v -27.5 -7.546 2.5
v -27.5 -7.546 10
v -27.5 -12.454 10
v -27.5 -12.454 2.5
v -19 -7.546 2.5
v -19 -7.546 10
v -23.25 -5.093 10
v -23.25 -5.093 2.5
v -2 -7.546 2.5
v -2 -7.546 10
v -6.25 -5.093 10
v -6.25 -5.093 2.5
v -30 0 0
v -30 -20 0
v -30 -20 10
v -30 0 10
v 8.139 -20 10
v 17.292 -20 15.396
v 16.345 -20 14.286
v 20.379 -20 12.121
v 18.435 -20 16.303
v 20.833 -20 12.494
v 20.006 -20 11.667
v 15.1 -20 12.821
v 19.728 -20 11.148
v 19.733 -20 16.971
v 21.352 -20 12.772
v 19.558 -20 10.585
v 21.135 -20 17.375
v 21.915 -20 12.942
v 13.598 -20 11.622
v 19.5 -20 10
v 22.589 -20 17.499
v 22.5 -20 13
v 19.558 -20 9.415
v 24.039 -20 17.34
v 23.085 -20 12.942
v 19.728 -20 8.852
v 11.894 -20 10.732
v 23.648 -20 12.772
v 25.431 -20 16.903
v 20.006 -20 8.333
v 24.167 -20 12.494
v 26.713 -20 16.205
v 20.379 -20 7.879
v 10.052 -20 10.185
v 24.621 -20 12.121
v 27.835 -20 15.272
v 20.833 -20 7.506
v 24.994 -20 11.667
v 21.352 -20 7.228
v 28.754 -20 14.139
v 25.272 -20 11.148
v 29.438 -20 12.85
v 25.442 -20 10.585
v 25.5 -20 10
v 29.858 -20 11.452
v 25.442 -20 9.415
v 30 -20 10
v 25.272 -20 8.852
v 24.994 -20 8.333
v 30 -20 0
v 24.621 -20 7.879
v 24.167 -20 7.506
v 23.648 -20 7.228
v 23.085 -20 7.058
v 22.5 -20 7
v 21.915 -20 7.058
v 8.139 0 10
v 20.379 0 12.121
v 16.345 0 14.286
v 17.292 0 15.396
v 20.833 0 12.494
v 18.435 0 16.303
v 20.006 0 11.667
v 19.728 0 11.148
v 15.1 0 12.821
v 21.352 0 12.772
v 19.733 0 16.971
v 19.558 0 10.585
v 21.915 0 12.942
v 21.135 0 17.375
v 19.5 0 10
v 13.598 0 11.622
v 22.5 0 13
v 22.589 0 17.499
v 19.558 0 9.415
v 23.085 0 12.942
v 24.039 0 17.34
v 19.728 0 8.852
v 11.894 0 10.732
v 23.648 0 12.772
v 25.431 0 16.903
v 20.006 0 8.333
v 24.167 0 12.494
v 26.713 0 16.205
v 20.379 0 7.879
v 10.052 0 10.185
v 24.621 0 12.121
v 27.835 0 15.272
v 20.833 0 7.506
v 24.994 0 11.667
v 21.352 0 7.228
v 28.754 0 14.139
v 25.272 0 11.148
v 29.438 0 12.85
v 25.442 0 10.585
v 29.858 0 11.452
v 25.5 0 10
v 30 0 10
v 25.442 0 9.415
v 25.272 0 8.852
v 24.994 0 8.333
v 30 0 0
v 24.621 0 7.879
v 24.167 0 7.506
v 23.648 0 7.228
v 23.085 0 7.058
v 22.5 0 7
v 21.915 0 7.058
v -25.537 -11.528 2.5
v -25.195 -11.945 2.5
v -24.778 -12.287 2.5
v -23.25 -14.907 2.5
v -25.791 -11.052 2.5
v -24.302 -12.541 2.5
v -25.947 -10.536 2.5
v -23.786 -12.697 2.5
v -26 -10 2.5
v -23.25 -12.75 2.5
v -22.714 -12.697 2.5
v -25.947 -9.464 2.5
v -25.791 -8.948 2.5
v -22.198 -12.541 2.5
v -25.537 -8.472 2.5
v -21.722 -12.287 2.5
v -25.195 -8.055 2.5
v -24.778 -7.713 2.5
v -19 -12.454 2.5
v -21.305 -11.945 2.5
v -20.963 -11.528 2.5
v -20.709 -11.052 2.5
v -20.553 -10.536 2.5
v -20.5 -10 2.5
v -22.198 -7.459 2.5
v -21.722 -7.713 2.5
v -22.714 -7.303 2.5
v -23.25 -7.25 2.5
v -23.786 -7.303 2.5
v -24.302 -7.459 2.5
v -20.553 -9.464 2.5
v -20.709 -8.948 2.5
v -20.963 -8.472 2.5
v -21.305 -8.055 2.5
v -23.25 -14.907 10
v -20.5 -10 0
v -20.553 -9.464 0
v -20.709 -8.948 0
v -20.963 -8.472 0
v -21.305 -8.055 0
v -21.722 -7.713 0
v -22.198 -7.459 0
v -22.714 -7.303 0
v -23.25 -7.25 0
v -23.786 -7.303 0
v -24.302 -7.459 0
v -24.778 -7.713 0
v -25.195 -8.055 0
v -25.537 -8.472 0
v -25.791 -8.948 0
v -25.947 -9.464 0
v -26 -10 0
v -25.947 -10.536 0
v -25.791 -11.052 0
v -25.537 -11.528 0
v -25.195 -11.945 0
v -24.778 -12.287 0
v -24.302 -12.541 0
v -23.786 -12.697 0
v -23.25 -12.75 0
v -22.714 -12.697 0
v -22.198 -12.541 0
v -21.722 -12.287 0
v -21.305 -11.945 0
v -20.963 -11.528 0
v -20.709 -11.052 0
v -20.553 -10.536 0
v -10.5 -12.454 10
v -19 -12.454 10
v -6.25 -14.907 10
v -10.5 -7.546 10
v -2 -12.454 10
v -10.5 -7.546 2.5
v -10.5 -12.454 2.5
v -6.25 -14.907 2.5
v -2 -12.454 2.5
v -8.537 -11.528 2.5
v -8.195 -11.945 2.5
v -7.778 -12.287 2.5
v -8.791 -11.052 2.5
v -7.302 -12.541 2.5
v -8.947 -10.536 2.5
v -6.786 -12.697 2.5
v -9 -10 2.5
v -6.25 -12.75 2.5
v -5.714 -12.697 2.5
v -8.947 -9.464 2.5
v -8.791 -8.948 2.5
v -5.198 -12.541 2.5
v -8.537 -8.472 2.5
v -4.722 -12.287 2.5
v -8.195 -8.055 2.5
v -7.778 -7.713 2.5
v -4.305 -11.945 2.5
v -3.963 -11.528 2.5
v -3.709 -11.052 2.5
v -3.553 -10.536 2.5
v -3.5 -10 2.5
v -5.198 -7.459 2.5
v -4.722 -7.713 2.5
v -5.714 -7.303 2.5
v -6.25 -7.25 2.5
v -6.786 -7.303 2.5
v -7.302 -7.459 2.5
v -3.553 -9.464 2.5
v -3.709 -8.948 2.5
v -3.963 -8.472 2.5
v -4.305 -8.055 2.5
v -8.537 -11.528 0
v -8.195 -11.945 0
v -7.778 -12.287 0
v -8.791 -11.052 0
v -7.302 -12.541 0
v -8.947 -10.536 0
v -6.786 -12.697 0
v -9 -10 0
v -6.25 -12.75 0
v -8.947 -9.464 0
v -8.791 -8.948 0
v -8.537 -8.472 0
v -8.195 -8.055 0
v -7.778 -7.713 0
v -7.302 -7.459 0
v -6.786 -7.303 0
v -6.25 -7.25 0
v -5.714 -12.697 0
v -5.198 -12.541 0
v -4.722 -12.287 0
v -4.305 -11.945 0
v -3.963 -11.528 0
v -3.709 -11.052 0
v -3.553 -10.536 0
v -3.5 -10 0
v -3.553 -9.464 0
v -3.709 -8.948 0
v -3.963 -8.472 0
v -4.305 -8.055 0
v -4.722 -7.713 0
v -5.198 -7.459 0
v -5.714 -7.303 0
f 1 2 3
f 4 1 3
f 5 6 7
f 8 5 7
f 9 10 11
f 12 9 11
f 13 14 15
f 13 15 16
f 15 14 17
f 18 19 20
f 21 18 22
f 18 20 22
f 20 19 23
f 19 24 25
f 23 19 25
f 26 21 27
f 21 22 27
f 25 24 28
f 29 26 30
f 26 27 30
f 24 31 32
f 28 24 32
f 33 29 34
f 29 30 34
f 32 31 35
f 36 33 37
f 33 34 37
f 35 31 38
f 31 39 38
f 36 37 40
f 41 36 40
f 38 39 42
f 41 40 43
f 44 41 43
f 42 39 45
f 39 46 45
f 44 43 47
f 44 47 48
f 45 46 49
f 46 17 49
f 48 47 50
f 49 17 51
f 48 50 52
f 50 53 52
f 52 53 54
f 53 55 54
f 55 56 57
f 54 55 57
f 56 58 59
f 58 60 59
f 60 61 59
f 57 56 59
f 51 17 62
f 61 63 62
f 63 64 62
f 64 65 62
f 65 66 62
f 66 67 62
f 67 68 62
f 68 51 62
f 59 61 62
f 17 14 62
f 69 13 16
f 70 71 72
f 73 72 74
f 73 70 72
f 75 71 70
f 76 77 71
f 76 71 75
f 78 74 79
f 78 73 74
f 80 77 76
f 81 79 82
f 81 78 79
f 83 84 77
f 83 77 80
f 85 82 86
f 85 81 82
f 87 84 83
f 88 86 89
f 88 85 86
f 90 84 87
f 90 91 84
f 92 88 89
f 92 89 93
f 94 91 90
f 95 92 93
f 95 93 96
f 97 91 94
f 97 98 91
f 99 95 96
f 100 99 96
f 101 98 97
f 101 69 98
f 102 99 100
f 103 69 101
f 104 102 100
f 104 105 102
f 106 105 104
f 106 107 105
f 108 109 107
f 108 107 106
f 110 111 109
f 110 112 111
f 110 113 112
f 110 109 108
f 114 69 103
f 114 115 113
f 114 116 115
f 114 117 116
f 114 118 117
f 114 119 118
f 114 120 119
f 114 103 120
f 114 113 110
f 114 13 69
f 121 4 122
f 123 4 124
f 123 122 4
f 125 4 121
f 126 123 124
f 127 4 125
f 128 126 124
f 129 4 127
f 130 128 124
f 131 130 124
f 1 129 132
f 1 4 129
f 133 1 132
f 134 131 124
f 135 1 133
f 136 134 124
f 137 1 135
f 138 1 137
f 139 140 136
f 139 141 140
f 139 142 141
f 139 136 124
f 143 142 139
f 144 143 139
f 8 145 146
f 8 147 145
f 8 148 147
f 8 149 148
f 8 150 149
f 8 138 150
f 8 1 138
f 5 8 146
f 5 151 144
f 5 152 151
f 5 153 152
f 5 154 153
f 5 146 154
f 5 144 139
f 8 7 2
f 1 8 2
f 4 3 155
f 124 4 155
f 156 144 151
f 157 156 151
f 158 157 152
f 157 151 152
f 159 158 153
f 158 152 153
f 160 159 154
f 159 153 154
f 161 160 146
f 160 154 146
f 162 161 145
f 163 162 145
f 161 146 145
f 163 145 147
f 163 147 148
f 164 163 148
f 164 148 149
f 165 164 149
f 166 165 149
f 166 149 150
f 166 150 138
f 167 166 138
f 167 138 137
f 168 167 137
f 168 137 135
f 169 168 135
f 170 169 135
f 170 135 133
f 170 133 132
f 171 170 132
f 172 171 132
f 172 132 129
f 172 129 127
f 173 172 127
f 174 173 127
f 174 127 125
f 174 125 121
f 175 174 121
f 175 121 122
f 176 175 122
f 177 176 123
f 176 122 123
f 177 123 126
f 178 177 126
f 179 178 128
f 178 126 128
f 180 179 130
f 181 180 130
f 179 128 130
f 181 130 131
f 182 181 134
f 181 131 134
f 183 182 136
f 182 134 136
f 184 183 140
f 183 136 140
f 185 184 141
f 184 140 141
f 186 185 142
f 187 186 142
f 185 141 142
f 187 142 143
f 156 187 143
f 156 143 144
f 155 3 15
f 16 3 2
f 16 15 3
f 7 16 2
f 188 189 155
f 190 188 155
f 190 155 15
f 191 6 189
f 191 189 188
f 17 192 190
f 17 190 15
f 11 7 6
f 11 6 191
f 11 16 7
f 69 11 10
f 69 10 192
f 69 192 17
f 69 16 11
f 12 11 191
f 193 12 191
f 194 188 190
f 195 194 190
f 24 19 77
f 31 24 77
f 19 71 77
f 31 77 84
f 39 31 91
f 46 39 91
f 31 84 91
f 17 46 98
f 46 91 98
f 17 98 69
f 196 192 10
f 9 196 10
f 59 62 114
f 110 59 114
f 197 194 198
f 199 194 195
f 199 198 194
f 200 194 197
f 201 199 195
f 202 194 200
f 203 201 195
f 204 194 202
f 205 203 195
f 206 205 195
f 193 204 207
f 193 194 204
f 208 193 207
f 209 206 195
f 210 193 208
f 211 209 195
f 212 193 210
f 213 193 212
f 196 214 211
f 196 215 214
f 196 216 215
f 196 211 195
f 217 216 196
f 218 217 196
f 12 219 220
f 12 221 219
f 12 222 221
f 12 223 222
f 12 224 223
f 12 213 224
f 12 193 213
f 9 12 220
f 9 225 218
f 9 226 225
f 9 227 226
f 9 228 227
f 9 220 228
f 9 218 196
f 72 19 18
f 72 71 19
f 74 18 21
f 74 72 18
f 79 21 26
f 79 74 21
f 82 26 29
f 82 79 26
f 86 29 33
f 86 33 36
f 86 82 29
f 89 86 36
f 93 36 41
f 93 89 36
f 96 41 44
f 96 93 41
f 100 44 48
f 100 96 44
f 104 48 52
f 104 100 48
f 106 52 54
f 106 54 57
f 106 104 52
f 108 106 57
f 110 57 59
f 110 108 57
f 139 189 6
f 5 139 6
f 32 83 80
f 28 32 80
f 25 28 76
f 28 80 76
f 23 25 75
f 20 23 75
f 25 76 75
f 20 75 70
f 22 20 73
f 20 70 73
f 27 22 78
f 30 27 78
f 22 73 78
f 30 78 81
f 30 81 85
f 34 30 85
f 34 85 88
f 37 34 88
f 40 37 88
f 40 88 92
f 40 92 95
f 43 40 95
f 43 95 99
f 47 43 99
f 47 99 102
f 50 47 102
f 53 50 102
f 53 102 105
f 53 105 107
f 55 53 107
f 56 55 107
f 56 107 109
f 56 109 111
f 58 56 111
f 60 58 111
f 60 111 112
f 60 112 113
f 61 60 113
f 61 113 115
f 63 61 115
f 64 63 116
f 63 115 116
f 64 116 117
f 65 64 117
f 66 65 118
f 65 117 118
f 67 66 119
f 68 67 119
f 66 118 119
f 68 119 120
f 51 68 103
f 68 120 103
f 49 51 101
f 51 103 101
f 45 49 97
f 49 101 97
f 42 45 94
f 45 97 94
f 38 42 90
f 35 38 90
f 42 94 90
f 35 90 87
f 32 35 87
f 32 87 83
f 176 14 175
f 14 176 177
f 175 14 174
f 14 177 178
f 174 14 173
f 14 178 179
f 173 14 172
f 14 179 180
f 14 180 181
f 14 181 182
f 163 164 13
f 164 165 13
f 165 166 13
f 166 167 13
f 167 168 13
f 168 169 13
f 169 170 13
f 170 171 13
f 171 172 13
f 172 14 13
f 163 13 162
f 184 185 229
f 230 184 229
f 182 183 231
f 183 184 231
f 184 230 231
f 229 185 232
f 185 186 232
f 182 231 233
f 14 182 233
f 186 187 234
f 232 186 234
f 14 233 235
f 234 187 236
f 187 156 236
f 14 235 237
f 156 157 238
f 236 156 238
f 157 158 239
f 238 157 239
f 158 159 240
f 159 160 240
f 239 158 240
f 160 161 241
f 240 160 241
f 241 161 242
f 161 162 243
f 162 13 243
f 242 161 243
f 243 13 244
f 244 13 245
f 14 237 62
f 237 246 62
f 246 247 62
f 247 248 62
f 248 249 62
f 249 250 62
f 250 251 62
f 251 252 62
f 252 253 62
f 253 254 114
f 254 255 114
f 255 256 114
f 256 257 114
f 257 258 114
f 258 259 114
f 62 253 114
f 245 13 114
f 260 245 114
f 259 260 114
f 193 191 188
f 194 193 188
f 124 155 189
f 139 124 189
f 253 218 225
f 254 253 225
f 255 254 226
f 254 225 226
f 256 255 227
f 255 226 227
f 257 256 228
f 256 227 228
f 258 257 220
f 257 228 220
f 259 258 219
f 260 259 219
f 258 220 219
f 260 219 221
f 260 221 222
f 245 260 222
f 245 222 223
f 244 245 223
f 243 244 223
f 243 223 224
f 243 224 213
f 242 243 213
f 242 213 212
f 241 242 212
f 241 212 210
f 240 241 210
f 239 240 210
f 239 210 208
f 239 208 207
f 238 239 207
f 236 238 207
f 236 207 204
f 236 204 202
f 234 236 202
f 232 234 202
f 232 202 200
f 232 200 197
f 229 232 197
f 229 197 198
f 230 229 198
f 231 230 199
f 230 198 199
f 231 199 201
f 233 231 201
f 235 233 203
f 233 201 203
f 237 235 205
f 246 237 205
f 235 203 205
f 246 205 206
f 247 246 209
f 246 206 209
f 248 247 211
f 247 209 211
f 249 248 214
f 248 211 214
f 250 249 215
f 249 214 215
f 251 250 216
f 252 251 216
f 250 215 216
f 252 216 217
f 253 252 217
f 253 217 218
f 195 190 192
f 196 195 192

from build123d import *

# Parameters (mm, degrees)
SKETCH1_W           = 60
SKETCH1_H           = 20
BOSS_EXTRUDE1_DEPTH = 10
CUT_EXTRUDE1_DEPTH  = 7.5
SKETCH5_R           = 2.75
CUT_EXTRUDE3_DEPTH  = 37.827299657
LPATTERN1_COUNT     = 2
LPATTERN1_PITCH     = 17
SKETCH3_R           = 7.5
BOSS_EXTRUDE2_DEPTH = 20
SKETCH4_R           = 3
CUT_EXTRUDE2_DEPTH  = 41.078048855
FILLET1_R           = 10


with BuildPart() as part:
    # Sketch1 → Boss-Extrude1 (new body)
    with BuildSketch(Plane.XY):
        with Locations((0, -10)):
            Rectangle(SKETCH1_W, SKETCH1_H)
    extrude(amount=BOSS_EXTRUDE1_DEPTH)

    # Sketch2 → Cut-Extrude1 (cut)
    with BuildSketch(Plane.XY.offset(10)):
        Polygon((-23.25, -14.907477288), (-19, -12.453738644), (-19, -7.546261356), (-23.25, -5.092522712), (-27.5, -7.546261356), (-27.5, -12.453738644), align=None)
    cut_extrude1 = extrude(amount=-CUT_EXTRUDE1_DEPTH, mode=Mode.SUBTRACT)

    # Sketch5 → Cut-Extrude3 (cut, through all)
    with BuildSketch(Plane.XY.offset(2.5)):
        with Locations((-23.25, -10)):
            Circle(SKETCH5_R)
    cut_extrude3 = extrude(amount=-CUT_EXTRUDE3_DEPTH, mode=Mode.SUBTRACT)

    # LPattern1: Cut-Extrude1, Cut-Extrude3 ×2
    with Locations(*[(i * LPATTERN1_PITCH, 0, 0) for i in range(1, LPATTERN1_COUNT)]):
        add(cut_extrude1, mode=Mode.SUBTRACT)
        add(cut_extrude3, mode=Mode.SUBTRACT)

    # Sketch3 → Boss-Extrude2 (add, through all)
    with BuildSketch(Plane(origin=(0, 0, 0), x_dir=(1, 0, 0), z_dir=(0, 1, 0))):
        with Locations((22.5, -10)):
            Circle(SKETCH3_R)
    extrude(amount=-BOSS_EXTRUDE2_DEPTH)

    # Sketch4 → Cut-Extrude2 (cut, through all)
    with BuildSketch(Plane(origin=(0, 0, 0), x_dir=(1, 0, 0), z_dir=(0, 1, 0))):
        with Locations(Location((22.5, -10, 0), (0, 0, 180))):
            Circle(SKETCH4_R)
    extrude(amount=-CUT_EXTRUDE2_DEPTH, mode=Mode.SUBTRACT)

    # Fillet1
    fillet1_edges = [part.edges().sort_by_distance(p)[0] for p in [
        (15, -10, 10),
    ]]
    fillet(fillet1_edges, radius=FILLET1_R)


solid = part.part
